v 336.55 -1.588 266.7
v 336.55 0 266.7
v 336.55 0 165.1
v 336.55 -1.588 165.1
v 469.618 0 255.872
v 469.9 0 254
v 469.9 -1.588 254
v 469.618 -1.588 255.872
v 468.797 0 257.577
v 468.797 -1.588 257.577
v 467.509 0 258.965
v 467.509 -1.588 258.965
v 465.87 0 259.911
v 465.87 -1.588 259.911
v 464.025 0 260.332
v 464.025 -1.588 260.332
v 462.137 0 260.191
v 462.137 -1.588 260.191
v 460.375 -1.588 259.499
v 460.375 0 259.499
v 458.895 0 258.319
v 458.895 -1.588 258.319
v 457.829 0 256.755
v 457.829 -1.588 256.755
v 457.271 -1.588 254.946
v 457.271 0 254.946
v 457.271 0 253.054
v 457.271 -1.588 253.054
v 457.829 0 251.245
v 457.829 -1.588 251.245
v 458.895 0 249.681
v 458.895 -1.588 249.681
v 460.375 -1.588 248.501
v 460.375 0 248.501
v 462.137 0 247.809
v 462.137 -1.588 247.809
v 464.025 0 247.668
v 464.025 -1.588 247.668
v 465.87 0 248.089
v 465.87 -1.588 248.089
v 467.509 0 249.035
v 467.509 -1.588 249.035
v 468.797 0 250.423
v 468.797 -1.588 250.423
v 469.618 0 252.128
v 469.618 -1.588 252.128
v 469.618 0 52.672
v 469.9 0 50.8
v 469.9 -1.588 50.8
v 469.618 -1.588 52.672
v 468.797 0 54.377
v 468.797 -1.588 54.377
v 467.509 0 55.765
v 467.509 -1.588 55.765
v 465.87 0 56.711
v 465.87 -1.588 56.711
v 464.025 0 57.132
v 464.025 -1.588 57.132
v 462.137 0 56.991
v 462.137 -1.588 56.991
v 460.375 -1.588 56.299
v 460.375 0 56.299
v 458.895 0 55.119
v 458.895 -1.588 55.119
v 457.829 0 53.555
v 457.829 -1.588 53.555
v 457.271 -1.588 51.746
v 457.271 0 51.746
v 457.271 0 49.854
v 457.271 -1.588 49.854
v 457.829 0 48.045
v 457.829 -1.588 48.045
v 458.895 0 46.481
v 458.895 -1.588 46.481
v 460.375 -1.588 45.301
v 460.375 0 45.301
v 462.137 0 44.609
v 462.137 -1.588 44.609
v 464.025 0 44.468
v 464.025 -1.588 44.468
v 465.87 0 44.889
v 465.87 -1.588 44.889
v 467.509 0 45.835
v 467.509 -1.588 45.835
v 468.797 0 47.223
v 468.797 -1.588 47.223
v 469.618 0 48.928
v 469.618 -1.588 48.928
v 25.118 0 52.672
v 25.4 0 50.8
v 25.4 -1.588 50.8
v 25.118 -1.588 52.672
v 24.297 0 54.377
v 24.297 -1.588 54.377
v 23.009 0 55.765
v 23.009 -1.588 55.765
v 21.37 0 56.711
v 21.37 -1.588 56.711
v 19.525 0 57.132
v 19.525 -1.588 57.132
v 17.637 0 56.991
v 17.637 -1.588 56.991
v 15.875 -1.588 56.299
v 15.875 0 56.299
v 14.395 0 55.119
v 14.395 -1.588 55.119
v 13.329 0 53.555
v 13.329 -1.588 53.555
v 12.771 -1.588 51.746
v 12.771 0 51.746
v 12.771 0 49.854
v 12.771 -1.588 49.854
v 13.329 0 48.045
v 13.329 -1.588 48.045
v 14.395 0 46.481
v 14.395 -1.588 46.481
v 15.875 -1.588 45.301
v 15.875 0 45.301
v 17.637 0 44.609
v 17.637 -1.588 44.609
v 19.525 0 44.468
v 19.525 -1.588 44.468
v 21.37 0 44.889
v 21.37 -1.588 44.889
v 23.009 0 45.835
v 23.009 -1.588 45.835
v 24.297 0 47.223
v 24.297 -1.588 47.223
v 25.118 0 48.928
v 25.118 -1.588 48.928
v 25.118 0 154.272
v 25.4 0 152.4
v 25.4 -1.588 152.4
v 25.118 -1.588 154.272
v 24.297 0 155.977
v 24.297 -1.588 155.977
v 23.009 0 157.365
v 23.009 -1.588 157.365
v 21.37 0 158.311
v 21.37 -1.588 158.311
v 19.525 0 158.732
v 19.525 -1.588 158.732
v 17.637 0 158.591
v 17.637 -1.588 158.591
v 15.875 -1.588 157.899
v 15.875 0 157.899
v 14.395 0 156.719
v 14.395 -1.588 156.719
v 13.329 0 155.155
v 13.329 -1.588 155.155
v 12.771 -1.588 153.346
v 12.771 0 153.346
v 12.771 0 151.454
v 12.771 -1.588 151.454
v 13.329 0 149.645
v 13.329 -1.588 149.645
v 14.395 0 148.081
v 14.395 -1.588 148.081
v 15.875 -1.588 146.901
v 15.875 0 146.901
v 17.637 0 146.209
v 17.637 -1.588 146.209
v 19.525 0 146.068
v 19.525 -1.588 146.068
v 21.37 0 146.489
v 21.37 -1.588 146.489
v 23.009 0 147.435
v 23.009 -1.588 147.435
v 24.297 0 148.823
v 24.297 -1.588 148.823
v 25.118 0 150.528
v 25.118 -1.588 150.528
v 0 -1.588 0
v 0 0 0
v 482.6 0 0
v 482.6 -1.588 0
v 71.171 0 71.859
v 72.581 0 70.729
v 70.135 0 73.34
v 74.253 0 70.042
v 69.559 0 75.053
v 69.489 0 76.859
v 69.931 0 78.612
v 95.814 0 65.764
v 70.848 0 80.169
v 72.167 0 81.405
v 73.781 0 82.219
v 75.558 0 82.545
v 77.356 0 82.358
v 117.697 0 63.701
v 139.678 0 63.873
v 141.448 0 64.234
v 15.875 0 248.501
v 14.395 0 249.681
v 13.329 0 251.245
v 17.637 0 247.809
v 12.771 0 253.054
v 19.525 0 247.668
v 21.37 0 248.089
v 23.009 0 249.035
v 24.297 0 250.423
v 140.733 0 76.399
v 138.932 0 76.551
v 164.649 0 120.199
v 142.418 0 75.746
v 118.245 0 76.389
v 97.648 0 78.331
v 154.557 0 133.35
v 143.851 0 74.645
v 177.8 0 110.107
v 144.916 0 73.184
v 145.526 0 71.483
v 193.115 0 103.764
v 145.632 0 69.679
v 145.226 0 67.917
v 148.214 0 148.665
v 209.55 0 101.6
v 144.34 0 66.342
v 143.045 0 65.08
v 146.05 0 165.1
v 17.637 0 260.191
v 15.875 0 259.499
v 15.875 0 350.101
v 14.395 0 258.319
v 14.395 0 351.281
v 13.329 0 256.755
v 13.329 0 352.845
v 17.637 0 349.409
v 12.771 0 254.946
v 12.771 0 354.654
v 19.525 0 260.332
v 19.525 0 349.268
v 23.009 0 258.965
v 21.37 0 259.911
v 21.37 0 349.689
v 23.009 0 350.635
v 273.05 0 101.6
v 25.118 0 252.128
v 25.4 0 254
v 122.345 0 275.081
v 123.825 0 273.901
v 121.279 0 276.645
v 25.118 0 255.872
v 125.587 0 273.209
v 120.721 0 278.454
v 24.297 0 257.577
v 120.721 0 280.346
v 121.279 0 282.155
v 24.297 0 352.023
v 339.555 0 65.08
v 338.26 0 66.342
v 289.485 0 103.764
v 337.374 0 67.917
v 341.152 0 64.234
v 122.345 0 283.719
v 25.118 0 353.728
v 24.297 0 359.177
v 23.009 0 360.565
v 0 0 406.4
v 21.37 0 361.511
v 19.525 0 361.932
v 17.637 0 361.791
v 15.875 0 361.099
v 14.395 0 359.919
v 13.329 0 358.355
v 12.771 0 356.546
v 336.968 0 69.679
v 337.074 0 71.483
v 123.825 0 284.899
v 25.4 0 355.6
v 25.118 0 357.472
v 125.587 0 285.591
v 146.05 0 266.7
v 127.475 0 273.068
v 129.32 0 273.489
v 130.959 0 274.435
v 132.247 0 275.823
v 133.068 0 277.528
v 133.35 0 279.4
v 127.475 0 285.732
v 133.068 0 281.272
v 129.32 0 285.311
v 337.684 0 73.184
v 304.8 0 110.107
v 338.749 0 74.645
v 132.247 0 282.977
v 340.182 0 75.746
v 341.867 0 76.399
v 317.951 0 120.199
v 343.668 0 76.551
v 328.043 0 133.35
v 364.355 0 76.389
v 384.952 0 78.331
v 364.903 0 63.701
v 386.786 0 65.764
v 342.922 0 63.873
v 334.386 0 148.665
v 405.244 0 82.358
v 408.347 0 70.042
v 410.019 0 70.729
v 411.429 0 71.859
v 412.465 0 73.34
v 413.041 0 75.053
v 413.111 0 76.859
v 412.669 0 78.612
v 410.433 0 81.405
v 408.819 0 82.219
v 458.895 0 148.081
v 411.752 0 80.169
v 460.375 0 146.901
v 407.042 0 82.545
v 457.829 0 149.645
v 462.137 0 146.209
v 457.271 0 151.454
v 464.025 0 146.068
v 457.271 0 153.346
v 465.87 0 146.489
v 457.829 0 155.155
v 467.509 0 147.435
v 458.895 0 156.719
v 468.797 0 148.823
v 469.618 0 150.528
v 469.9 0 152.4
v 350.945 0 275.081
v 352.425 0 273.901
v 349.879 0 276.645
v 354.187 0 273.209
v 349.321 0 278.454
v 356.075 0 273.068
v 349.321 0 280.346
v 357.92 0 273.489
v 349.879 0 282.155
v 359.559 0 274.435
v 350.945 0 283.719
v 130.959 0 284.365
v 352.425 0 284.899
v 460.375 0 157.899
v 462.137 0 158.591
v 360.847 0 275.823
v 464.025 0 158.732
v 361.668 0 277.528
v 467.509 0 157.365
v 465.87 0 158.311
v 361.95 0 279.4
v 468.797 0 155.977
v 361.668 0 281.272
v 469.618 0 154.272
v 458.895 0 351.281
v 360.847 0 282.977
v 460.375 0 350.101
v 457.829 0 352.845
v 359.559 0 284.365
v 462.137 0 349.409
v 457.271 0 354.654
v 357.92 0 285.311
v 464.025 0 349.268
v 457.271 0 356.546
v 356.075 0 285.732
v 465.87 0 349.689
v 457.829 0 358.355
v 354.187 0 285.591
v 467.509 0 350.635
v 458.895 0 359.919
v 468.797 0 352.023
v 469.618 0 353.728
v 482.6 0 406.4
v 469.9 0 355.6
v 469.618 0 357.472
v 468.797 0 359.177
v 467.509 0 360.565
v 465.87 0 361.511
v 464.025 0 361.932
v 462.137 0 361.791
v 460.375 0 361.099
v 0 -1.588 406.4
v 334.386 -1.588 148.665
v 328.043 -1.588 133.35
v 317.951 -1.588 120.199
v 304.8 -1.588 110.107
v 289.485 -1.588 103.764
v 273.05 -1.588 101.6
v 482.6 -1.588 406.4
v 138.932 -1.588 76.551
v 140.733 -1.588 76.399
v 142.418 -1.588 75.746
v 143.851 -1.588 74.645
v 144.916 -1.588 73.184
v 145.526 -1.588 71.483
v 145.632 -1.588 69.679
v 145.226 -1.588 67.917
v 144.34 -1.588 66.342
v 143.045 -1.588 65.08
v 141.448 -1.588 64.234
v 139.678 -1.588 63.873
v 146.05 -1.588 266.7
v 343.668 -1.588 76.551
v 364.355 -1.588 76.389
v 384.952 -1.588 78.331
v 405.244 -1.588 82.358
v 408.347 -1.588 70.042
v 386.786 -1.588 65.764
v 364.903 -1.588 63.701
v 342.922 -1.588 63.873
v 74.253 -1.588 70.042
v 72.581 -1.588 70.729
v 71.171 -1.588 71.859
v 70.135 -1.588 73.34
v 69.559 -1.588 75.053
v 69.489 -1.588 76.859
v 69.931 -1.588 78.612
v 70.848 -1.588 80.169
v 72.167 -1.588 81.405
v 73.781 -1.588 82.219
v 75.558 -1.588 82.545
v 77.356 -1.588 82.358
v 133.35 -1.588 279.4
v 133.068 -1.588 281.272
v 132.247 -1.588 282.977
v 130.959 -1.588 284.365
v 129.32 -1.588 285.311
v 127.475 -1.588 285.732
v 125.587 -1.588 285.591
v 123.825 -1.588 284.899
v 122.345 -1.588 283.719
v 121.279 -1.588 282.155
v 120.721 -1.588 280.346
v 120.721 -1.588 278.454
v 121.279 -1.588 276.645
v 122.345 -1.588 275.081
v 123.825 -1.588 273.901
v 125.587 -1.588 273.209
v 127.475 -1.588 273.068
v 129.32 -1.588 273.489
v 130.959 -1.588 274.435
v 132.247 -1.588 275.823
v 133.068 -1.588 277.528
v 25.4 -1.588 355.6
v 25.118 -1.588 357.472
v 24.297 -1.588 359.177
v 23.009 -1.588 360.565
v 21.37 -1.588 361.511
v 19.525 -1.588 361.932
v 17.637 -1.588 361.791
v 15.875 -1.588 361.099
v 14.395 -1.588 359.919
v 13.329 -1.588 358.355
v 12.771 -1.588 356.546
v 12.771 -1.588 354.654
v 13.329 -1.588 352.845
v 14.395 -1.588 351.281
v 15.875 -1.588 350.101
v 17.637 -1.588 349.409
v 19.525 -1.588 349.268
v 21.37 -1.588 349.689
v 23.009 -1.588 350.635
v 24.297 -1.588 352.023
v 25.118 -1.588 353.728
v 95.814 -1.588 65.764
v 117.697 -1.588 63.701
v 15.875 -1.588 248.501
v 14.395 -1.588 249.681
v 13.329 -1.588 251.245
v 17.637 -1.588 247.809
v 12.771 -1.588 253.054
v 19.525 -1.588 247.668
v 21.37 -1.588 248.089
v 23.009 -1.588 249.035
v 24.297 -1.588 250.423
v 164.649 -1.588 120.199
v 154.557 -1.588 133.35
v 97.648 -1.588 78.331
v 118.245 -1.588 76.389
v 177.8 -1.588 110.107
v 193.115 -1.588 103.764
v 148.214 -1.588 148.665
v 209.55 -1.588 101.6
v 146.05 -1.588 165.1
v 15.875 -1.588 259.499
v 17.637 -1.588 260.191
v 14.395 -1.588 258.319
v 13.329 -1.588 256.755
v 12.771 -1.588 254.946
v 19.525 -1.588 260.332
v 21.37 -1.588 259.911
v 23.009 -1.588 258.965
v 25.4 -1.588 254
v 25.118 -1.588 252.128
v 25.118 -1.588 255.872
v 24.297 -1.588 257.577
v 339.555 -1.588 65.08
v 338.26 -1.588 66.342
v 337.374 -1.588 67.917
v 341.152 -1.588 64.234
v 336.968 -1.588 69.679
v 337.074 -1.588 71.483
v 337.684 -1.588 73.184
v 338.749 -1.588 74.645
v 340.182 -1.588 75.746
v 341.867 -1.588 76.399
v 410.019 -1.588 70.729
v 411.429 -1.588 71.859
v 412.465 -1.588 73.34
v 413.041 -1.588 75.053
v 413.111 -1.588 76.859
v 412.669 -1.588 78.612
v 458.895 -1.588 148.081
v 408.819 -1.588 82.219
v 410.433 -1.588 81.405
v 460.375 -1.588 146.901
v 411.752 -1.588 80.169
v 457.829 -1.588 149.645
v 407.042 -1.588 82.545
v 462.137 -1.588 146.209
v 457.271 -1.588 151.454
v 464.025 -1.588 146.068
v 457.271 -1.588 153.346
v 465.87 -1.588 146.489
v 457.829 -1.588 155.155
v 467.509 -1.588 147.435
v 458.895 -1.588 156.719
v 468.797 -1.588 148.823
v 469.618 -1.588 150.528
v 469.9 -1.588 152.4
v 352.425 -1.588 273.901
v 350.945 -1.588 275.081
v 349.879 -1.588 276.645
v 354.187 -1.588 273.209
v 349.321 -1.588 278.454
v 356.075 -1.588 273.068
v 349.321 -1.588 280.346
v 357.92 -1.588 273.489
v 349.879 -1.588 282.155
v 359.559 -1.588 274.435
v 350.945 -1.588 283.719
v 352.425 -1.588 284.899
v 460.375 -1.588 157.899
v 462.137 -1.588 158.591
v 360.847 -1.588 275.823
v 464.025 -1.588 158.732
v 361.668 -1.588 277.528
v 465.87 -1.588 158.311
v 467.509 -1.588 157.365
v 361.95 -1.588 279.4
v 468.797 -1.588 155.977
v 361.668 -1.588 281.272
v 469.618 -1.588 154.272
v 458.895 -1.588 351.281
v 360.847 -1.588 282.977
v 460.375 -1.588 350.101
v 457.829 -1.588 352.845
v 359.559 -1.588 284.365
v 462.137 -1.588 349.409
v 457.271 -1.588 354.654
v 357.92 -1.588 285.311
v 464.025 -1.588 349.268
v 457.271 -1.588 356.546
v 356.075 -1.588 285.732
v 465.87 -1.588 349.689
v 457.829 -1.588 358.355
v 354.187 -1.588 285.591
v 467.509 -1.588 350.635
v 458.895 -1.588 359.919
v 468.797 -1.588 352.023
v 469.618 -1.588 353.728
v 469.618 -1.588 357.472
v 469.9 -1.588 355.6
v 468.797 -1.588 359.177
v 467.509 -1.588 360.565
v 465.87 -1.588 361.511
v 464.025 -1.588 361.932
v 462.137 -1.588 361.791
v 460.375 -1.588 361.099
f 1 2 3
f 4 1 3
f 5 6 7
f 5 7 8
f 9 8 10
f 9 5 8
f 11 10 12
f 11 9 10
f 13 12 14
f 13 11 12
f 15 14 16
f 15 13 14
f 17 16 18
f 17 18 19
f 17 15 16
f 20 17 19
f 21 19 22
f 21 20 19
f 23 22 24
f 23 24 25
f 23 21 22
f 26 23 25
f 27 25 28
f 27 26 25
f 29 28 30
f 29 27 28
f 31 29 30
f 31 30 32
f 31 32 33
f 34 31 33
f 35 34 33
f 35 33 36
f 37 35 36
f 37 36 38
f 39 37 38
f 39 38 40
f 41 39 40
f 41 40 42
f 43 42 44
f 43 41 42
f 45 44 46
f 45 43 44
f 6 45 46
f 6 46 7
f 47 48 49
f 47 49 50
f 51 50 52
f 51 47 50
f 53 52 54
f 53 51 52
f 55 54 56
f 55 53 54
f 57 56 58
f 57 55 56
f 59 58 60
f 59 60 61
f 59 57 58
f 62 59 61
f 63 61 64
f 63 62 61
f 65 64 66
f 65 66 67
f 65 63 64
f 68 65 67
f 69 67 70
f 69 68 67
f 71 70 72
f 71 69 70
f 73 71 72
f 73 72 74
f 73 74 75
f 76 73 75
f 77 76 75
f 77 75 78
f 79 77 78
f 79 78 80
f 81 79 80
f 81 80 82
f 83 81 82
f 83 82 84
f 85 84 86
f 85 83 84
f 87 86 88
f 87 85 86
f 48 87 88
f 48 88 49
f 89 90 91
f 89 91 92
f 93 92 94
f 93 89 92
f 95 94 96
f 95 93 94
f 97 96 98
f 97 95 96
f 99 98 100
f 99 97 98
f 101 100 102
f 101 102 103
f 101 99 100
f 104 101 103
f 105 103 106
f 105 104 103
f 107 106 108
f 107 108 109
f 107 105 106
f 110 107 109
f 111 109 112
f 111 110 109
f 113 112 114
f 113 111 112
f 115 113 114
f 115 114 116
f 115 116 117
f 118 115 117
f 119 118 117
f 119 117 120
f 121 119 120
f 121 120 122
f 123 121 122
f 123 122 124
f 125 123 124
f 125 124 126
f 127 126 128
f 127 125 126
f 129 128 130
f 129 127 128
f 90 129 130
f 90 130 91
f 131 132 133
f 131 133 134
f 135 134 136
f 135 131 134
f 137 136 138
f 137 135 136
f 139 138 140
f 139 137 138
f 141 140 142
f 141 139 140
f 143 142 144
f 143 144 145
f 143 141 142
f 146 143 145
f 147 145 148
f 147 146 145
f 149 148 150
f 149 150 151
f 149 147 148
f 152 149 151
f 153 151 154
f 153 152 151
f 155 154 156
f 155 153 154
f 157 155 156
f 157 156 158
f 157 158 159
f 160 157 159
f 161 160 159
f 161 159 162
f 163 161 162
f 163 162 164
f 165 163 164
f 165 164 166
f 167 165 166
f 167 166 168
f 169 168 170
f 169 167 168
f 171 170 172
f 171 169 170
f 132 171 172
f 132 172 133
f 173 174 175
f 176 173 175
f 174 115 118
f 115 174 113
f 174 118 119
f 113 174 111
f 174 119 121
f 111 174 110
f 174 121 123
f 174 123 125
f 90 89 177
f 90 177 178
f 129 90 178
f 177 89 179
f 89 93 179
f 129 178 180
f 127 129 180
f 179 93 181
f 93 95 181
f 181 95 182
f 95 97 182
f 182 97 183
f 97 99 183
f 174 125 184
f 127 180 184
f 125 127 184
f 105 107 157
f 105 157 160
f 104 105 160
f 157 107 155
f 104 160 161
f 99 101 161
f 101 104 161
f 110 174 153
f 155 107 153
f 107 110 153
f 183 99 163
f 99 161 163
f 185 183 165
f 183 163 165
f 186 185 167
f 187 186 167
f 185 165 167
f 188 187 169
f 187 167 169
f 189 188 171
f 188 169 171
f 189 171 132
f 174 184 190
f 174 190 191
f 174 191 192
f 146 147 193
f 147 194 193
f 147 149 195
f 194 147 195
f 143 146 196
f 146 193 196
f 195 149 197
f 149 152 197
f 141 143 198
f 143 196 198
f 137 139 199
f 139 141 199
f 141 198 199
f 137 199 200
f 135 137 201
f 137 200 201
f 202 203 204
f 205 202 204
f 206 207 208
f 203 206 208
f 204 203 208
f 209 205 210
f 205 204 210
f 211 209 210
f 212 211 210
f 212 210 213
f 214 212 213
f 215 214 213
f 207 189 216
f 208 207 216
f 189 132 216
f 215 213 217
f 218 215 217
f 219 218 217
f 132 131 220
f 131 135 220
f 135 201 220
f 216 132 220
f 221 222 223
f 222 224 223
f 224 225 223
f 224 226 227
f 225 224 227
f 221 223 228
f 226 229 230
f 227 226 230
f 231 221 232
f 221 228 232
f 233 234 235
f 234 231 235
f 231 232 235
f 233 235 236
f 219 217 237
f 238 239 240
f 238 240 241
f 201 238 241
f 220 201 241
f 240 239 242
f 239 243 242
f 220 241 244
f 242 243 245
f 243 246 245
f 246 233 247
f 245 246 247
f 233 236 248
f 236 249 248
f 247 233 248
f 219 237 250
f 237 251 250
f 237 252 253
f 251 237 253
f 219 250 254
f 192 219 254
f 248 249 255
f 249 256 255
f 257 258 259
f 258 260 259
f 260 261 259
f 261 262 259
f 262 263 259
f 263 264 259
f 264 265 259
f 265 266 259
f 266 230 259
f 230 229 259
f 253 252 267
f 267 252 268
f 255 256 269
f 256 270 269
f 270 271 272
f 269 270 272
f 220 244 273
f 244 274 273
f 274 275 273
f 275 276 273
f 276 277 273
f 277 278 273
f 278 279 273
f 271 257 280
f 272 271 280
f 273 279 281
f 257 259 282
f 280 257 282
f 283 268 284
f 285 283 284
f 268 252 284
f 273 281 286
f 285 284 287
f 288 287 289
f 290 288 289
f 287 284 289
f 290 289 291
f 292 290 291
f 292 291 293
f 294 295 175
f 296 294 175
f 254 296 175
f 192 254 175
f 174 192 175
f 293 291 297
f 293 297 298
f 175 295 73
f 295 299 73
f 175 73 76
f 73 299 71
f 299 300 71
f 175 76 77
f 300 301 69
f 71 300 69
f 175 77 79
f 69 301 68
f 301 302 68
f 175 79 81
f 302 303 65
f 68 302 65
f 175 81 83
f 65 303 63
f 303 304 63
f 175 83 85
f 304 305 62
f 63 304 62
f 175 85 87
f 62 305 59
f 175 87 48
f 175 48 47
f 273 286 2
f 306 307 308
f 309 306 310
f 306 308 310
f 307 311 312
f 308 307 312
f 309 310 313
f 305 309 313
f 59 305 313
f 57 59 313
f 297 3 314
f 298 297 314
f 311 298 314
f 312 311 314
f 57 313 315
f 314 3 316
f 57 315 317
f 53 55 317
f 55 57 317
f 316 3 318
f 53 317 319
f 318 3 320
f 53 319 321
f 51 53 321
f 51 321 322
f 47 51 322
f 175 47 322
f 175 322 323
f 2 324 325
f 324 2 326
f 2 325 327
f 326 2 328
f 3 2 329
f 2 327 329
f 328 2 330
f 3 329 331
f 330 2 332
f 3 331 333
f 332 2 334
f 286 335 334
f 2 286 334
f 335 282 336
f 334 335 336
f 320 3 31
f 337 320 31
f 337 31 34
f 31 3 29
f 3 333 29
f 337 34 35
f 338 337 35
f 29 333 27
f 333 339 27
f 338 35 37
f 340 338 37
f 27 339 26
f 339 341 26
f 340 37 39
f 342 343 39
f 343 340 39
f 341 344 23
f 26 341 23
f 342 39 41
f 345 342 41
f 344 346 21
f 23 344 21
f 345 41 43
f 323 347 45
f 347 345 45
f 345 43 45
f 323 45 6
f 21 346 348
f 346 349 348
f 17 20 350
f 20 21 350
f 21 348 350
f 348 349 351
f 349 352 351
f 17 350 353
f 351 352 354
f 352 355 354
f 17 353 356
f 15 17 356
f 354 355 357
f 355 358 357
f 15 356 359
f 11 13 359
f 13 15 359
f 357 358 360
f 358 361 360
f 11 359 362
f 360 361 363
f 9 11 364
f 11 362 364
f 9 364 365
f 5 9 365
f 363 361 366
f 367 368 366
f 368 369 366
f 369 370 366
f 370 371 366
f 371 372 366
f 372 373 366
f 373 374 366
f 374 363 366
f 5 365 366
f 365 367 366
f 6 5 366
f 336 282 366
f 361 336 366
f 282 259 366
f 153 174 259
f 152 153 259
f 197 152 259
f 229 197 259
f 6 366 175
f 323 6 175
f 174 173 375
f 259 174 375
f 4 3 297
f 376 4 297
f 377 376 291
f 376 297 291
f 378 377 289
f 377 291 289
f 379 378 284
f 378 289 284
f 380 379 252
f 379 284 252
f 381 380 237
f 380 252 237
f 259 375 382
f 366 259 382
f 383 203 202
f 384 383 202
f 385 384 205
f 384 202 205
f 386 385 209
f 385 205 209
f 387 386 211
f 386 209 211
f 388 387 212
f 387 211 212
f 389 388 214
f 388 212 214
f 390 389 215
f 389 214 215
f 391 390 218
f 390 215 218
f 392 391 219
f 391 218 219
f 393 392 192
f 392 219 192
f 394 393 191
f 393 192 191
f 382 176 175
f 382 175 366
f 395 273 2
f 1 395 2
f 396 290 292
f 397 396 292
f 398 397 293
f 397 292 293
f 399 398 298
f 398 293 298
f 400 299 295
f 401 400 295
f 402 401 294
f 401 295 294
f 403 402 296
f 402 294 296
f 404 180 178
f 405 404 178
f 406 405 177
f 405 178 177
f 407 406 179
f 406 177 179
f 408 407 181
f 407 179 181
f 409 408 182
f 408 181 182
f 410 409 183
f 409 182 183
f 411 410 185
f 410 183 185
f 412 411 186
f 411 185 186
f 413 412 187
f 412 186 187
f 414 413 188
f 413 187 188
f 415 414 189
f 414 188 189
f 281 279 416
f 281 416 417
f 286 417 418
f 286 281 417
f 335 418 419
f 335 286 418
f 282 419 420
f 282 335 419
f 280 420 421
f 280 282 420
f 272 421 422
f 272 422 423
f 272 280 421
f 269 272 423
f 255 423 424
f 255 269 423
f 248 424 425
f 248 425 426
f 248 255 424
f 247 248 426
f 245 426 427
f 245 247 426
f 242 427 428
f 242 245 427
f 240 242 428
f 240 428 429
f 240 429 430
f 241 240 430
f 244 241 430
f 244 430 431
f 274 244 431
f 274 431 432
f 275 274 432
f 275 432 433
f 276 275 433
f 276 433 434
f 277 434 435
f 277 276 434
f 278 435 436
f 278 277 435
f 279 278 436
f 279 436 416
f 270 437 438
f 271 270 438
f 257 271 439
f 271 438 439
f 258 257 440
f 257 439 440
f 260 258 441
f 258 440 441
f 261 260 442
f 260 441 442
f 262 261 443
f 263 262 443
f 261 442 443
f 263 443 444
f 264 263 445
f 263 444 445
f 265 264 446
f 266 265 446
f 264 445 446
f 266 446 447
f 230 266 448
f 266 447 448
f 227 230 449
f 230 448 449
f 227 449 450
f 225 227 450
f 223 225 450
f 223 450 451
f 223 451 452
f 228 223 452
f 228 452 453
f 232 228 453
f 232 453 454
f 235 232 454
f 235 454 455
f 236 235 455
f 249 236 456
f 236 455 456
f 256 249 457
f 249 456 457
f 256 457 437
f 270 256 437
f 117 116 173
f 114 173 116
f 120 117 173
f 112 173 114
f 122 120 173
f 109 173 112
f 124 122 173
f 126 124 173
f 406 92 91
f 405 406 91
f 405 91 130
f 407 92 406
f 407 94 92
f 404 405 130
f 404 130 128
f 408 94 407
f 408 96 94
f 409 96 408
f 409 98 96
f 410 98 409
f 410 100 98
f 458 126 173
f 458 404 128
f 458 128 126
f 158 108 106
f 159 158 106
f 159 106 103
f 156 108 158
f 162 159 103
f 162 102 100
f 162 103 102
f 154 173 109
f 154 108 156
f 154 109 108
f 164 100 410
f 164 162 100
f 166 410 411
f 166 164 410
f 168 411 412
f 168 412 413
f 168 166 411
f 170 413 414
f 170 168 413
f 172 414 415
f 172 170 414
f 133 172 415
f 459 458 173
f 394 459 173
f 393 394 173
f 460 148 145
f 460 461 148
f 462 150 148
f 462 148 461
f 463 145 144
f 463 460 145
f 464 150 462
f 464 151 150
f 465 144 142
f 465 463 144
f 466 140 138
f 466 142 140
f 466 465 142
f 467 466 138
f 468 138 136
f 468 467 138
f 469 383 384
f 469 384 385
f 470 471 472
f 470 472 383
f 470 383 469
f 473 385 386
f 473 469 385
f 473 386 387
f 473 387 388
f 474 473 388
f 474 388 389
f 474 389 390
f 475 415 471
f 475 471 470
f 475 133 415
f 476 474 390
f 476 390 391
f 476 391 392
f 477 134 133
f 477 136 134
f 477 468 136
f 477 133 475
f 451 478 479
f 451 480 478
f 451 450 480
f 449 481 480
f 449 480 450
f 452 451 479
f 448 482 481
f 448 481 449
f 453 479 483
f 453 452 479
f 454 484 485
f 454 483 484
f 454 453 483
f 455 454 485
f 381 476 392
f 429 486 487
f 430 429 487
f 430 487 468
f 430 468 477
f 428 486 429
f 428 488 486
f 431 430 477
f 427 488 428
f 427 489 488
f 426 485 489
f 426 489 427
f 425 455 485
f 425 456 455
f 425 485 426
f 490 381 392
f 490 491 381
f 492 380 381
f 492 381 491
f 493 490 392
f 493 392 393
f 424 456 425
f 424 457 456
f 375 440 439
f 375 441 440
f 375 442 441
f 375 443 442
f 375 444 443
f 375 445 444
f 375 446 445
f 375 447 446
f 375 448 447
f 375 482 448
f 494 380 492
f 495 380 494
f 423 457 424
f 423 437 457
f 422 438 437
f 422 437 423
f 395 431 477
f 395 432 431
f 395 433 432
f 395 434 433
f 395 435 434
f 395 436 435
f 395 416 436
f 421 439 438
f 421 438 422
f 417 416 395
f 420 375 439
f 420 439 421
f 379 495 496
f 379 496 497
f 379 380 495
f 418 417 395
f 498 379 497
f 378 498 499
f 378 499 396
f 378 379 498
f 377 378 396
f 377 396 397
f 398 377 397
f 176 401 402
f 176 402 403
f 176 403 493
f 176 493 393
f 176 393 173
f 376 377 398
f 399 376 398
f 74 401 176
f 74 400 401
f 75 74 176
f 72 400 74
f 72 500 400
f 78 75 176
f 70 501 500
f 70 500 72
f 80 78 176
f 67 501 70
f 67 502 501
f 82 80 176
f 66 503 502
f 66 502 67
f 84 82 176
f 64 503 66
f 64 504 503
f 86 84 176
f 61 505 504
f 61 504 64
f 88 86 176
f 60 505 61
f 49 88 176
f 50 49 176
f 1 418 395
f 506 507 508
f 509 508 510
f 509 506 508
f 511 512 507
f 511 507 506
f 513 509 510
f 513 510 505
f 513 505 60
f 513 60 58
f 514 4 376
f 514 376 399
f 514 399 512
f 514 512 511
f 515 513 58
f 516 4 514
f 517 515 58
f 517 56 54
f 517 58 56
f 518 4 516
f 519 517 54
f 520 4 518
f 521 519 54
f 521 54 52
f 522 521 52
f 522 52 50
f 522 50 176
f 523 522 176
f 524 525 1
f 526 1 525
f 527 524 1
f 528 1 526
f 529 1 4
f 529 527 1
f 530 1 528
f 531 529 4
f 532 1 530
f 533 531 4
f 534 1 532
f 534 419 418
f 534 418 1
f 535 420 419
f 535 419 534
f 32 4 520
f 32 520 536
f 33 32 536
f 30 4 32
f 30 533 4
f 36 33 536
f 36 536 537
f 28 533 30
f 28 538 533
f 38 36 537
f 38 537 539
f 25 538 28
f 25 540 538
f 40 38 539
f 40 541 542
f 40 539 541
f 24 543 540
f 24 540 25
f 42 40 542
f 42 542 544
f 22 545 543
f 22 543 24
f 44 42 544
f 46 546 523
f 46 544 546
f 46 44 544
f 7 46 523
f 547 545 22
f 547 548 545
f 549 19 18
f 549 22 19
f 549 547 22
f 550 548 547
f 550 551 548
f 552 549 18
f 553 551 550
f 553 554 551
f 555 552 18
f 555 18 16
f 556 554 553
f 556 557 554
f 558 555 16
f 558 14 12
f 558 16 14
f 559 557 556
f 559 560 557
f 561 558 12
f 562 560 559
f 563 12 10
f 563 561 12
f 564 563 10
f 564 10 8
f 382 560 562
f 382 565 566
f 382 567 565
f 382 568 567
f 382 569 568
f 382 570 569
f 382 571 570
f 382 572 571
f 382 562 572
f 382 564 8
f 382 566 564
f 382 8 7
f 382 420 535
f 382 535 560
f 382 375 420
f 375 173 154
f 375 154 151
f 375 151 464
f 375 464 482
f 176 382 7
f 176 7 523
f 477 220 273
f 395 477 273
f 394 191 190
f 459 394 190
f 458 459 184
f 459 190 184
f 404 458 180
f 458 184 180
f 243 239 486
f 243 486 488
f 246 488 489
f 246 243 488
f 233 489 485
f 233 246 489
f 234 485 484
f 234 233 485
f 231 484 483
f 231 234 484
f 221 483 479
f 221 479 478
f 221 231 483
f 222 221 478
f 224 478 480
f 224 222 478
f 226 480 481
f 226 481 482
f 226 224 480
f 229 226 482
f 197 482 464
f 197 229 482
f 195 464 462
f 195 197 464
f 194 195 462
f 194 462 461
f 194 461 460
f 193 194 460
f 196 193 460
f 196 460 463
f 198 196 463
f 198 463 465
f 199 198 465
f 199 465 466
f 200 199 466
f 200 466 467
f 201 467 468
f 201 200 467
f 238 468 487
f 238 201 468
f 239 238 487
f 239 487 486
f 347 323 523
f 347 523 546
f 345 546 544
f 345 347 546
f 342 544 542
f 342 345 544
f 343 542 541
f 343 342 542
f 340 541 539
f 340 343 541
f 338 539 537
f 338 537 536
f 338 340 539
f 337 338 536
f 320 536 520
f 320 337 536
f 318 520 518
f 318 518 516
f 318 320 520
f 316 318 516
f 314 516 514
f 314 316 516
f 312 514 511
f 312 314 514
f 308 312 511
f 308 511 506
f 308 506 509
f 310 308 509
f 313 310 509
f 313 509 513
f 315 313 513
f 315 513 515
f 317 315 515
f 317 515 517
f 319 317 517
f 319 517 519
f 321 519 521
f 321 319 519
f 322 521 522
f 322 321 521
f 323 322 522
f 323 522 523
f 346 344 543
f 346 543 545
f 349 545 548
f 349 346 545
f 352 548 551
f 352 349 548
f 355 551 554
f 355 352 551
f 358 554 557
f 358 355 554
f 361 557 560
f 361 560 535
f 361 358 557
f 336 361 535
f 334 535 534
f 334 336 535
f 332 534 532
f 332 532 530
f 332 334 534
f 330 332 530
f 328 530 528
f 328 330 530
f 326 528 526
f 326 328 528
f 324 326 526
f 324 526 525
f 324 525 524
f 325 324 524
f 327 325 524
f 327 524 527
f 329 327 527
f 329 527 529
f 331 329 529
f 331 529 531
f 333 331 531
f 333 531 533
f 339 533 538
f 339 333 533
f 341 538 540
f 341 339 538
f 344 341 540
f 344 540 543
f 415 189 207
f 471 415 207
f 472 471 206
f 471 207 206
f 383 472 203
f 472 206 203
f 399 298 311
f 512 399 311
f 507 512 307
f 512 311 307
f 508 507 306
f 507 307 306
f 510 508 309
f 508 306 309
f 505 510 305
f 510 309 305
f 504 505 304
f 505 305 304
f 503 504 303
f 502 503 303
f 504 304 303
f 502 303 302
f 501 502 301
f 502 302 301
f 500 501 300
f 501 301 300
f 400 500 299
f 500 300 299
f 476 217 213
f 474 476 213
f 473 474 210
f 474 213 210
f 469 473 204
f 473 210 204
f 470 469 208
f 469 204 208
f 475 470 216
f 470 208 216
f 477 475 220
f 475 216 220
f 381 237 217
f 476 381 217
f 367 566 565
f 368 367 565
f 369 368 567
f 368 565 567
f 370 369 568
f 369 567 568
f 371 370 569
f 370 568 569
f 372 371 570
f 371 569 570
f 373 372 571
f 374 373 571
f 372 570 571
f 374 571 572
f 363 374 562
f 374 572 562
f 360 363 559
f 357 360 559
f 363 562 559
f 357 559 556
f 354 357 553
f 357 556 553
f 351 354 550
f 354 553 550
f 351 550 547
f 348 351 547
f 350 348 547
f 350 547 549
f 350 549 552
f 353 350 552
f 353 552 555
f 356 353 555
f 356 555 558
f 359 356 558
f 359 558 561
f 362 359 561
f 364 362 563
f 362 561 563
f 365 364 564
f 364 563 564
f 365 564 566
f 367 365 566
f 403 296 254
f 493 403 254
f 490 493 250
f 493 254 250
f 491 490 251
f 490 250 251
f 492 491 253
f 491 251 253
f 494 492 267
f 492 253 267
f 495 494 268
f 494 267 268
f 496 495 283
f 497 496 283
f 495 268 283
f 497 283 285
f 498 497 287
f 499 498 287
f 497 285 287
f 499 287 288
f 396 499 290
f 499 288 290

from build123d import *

# Parameters (mm, degrees)
F0_R     = 6.35
F1_DEPTH = 1.5875
F2_W     = 482.6
F2_H     = 101.6
F2_R     = 6.35
F3_DEPTH = 1.5875


with BuildPart() as f1:
    # F0 (on Front) → F1 (new body)
    with BuildSketch(Plane.XZ):
        Polygon((0, 304.8), (0, 0), (482.6, 0), (482.6, 304.8), (349.25, 304.8), (336.55, 304.8), (146.05, 304.8), align=None)
        with Locations((19.05, 50.8)):
            Circle(F0_R, mode=Mode.SUBTRACT)
        with BuildLine():
            ThreePointArc((139.677532, 63.87253), (106.72929, 64.453708), (74.253289, 70.042424))
            ThreePointArc((74.253289, 70.042424), (69.647088, 77.751374), (77.356037, 82.357576))
            ThreePointArc((77.356037, 82.357576), (107.921685, 77.097608), (138.931795, 76.550617))
            ThreePointArc((138.931795, 76.550617), (145.643707, 70.584442), (139.677532, 63.87253))
        make_face(mode=Mode.SUBTRACT)
        with BuildLine():
            ThreePointArc((405.243963, 82.357576), (412.952912, 77.751374), (408.346711, 70.042424))
            ThreePointArc((408.346711, 70.042424), (375.87071, 64.453708), (342.922468, 63.87253))
            ThreePointArc((342.922468, 63.87253), (336.956293, 70.584442), (343.668205, 76.550617))
            ThreePointArc((343.668205, 76.550617), (374.678315, 77.097608), (405.243963, 82.357576))
        make_face(mode=Mode.SUBTRACT)
        with Locations((463.55, 50.8)):
            Circle(F0_R, mode=Mode.SUBTRACT)
        with Locations((19.05, 152.4)):
            Circle(F0_R, mode=Mode.SUBTRACT)
        with Locations((19.05, 254)):
            Circle(F0_R, mode=Mode.SUBTRACT)
        with Locations((127, 279.4)):
            Circle(F0_R, mode=Mode.SUBTRACT)
        with BuildLine():
            Line((146.05, 165.1), (146.05, 266.7))
            Line((146.05, 266.7), (336.55, 266.7))
            Line((336.55, 266.7), (336.55, 165.1))
            ThreePointArc((336.55, 165.1), (317.951281, 120.198719), (273.05, 101.6))
            Line((273.05, 101.6), (209.55, 101.6))
            ThreePointArc((209.55, 101.6), (164.648719, 120.198719), (146.05, 165.1))
        make_face(mode=Mode.SUBTRACT)
        with Locations((463.55, 152.4)):
            Circle(F0_R, mode=Mode.SUBTRACT)
        with Locations((355.6, 279.4)):
            Circle(F0_R, mode=Mode.SUBTRACT)
        with Locations((463.55, 254)):
            Circle(F0_R, mode=Mode.SUBTRACT)
    extrude(amount=F1_DEPTH)

    # F2 (on face) → F3 (join)
    with BuildSketch(Plane.XZ.offset(1.5875)):
        with Locations((241.3, 355.6)):
            Rectangle(F2_W, F2_H)
        with Locations((19.05, 355.6)):
            Circle(F2_R, mode=Mode.SUBTRACT)
        with Locations((463.55, 355.6)):
            Circle(F2_R, mode=Mode.SUBTRACT)
    extrude(amount=-F3_DEPTH)


solid = f1.part
